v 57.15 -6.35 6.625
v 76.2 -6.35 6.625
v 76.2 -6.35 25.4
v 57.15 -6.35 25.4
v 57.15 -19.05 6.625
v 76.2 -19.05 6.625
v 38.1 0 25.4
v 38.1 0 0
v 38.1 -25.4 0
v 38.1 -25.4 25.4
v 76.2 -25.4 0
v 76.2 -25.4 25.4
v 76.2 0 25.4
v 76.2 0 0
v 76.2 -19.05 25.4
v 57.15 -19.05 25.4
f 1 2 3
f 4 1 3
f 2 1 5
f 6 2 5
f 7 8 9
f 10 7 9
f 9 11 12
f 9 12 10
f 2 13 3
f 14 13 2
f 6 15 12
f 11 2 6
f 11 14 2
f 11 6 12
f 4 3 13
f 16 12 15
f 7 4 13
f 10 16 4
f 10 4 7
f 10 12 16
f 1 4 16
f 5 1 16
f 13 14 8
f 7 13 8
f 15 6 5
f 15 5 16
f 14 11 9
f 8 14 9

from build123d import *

# Parameters (mm, degrees)
F0_W     = 38.1
F0_H     = 25.4
F1_DEPTH = 25.4
F2_W     = 12.7
F2_H     = 19.05
F3_DEPTH = 19.05
F4_ANGLE = 180


with BuildPart() as f1:
    # F0 (on Top) → F1 (new body)
    with BuildSketch(Plane.XY):
        with Locations((19.05, 12.7)):
            Rectangle(F0_W, F0_H)
    extrude(amount=F1_DEPTH)

    # F2 (on Right) → F3 (cut)
    with BuildSketch(Plane.YZ):
        with Locations((12.7, 16.149852)):
            Rectangle(F2_W, F2_H)
    extrude(amount=F3_DEPTH, mode=Mode.SUBTRACT)


with BuildPart() as f1_1:
    # F4: moved
    add(f1.part.rotate(Axis((38.1, 0, 12.7), (0, 0, 1)), F4_ANGLE))


solid = f1_1.part
